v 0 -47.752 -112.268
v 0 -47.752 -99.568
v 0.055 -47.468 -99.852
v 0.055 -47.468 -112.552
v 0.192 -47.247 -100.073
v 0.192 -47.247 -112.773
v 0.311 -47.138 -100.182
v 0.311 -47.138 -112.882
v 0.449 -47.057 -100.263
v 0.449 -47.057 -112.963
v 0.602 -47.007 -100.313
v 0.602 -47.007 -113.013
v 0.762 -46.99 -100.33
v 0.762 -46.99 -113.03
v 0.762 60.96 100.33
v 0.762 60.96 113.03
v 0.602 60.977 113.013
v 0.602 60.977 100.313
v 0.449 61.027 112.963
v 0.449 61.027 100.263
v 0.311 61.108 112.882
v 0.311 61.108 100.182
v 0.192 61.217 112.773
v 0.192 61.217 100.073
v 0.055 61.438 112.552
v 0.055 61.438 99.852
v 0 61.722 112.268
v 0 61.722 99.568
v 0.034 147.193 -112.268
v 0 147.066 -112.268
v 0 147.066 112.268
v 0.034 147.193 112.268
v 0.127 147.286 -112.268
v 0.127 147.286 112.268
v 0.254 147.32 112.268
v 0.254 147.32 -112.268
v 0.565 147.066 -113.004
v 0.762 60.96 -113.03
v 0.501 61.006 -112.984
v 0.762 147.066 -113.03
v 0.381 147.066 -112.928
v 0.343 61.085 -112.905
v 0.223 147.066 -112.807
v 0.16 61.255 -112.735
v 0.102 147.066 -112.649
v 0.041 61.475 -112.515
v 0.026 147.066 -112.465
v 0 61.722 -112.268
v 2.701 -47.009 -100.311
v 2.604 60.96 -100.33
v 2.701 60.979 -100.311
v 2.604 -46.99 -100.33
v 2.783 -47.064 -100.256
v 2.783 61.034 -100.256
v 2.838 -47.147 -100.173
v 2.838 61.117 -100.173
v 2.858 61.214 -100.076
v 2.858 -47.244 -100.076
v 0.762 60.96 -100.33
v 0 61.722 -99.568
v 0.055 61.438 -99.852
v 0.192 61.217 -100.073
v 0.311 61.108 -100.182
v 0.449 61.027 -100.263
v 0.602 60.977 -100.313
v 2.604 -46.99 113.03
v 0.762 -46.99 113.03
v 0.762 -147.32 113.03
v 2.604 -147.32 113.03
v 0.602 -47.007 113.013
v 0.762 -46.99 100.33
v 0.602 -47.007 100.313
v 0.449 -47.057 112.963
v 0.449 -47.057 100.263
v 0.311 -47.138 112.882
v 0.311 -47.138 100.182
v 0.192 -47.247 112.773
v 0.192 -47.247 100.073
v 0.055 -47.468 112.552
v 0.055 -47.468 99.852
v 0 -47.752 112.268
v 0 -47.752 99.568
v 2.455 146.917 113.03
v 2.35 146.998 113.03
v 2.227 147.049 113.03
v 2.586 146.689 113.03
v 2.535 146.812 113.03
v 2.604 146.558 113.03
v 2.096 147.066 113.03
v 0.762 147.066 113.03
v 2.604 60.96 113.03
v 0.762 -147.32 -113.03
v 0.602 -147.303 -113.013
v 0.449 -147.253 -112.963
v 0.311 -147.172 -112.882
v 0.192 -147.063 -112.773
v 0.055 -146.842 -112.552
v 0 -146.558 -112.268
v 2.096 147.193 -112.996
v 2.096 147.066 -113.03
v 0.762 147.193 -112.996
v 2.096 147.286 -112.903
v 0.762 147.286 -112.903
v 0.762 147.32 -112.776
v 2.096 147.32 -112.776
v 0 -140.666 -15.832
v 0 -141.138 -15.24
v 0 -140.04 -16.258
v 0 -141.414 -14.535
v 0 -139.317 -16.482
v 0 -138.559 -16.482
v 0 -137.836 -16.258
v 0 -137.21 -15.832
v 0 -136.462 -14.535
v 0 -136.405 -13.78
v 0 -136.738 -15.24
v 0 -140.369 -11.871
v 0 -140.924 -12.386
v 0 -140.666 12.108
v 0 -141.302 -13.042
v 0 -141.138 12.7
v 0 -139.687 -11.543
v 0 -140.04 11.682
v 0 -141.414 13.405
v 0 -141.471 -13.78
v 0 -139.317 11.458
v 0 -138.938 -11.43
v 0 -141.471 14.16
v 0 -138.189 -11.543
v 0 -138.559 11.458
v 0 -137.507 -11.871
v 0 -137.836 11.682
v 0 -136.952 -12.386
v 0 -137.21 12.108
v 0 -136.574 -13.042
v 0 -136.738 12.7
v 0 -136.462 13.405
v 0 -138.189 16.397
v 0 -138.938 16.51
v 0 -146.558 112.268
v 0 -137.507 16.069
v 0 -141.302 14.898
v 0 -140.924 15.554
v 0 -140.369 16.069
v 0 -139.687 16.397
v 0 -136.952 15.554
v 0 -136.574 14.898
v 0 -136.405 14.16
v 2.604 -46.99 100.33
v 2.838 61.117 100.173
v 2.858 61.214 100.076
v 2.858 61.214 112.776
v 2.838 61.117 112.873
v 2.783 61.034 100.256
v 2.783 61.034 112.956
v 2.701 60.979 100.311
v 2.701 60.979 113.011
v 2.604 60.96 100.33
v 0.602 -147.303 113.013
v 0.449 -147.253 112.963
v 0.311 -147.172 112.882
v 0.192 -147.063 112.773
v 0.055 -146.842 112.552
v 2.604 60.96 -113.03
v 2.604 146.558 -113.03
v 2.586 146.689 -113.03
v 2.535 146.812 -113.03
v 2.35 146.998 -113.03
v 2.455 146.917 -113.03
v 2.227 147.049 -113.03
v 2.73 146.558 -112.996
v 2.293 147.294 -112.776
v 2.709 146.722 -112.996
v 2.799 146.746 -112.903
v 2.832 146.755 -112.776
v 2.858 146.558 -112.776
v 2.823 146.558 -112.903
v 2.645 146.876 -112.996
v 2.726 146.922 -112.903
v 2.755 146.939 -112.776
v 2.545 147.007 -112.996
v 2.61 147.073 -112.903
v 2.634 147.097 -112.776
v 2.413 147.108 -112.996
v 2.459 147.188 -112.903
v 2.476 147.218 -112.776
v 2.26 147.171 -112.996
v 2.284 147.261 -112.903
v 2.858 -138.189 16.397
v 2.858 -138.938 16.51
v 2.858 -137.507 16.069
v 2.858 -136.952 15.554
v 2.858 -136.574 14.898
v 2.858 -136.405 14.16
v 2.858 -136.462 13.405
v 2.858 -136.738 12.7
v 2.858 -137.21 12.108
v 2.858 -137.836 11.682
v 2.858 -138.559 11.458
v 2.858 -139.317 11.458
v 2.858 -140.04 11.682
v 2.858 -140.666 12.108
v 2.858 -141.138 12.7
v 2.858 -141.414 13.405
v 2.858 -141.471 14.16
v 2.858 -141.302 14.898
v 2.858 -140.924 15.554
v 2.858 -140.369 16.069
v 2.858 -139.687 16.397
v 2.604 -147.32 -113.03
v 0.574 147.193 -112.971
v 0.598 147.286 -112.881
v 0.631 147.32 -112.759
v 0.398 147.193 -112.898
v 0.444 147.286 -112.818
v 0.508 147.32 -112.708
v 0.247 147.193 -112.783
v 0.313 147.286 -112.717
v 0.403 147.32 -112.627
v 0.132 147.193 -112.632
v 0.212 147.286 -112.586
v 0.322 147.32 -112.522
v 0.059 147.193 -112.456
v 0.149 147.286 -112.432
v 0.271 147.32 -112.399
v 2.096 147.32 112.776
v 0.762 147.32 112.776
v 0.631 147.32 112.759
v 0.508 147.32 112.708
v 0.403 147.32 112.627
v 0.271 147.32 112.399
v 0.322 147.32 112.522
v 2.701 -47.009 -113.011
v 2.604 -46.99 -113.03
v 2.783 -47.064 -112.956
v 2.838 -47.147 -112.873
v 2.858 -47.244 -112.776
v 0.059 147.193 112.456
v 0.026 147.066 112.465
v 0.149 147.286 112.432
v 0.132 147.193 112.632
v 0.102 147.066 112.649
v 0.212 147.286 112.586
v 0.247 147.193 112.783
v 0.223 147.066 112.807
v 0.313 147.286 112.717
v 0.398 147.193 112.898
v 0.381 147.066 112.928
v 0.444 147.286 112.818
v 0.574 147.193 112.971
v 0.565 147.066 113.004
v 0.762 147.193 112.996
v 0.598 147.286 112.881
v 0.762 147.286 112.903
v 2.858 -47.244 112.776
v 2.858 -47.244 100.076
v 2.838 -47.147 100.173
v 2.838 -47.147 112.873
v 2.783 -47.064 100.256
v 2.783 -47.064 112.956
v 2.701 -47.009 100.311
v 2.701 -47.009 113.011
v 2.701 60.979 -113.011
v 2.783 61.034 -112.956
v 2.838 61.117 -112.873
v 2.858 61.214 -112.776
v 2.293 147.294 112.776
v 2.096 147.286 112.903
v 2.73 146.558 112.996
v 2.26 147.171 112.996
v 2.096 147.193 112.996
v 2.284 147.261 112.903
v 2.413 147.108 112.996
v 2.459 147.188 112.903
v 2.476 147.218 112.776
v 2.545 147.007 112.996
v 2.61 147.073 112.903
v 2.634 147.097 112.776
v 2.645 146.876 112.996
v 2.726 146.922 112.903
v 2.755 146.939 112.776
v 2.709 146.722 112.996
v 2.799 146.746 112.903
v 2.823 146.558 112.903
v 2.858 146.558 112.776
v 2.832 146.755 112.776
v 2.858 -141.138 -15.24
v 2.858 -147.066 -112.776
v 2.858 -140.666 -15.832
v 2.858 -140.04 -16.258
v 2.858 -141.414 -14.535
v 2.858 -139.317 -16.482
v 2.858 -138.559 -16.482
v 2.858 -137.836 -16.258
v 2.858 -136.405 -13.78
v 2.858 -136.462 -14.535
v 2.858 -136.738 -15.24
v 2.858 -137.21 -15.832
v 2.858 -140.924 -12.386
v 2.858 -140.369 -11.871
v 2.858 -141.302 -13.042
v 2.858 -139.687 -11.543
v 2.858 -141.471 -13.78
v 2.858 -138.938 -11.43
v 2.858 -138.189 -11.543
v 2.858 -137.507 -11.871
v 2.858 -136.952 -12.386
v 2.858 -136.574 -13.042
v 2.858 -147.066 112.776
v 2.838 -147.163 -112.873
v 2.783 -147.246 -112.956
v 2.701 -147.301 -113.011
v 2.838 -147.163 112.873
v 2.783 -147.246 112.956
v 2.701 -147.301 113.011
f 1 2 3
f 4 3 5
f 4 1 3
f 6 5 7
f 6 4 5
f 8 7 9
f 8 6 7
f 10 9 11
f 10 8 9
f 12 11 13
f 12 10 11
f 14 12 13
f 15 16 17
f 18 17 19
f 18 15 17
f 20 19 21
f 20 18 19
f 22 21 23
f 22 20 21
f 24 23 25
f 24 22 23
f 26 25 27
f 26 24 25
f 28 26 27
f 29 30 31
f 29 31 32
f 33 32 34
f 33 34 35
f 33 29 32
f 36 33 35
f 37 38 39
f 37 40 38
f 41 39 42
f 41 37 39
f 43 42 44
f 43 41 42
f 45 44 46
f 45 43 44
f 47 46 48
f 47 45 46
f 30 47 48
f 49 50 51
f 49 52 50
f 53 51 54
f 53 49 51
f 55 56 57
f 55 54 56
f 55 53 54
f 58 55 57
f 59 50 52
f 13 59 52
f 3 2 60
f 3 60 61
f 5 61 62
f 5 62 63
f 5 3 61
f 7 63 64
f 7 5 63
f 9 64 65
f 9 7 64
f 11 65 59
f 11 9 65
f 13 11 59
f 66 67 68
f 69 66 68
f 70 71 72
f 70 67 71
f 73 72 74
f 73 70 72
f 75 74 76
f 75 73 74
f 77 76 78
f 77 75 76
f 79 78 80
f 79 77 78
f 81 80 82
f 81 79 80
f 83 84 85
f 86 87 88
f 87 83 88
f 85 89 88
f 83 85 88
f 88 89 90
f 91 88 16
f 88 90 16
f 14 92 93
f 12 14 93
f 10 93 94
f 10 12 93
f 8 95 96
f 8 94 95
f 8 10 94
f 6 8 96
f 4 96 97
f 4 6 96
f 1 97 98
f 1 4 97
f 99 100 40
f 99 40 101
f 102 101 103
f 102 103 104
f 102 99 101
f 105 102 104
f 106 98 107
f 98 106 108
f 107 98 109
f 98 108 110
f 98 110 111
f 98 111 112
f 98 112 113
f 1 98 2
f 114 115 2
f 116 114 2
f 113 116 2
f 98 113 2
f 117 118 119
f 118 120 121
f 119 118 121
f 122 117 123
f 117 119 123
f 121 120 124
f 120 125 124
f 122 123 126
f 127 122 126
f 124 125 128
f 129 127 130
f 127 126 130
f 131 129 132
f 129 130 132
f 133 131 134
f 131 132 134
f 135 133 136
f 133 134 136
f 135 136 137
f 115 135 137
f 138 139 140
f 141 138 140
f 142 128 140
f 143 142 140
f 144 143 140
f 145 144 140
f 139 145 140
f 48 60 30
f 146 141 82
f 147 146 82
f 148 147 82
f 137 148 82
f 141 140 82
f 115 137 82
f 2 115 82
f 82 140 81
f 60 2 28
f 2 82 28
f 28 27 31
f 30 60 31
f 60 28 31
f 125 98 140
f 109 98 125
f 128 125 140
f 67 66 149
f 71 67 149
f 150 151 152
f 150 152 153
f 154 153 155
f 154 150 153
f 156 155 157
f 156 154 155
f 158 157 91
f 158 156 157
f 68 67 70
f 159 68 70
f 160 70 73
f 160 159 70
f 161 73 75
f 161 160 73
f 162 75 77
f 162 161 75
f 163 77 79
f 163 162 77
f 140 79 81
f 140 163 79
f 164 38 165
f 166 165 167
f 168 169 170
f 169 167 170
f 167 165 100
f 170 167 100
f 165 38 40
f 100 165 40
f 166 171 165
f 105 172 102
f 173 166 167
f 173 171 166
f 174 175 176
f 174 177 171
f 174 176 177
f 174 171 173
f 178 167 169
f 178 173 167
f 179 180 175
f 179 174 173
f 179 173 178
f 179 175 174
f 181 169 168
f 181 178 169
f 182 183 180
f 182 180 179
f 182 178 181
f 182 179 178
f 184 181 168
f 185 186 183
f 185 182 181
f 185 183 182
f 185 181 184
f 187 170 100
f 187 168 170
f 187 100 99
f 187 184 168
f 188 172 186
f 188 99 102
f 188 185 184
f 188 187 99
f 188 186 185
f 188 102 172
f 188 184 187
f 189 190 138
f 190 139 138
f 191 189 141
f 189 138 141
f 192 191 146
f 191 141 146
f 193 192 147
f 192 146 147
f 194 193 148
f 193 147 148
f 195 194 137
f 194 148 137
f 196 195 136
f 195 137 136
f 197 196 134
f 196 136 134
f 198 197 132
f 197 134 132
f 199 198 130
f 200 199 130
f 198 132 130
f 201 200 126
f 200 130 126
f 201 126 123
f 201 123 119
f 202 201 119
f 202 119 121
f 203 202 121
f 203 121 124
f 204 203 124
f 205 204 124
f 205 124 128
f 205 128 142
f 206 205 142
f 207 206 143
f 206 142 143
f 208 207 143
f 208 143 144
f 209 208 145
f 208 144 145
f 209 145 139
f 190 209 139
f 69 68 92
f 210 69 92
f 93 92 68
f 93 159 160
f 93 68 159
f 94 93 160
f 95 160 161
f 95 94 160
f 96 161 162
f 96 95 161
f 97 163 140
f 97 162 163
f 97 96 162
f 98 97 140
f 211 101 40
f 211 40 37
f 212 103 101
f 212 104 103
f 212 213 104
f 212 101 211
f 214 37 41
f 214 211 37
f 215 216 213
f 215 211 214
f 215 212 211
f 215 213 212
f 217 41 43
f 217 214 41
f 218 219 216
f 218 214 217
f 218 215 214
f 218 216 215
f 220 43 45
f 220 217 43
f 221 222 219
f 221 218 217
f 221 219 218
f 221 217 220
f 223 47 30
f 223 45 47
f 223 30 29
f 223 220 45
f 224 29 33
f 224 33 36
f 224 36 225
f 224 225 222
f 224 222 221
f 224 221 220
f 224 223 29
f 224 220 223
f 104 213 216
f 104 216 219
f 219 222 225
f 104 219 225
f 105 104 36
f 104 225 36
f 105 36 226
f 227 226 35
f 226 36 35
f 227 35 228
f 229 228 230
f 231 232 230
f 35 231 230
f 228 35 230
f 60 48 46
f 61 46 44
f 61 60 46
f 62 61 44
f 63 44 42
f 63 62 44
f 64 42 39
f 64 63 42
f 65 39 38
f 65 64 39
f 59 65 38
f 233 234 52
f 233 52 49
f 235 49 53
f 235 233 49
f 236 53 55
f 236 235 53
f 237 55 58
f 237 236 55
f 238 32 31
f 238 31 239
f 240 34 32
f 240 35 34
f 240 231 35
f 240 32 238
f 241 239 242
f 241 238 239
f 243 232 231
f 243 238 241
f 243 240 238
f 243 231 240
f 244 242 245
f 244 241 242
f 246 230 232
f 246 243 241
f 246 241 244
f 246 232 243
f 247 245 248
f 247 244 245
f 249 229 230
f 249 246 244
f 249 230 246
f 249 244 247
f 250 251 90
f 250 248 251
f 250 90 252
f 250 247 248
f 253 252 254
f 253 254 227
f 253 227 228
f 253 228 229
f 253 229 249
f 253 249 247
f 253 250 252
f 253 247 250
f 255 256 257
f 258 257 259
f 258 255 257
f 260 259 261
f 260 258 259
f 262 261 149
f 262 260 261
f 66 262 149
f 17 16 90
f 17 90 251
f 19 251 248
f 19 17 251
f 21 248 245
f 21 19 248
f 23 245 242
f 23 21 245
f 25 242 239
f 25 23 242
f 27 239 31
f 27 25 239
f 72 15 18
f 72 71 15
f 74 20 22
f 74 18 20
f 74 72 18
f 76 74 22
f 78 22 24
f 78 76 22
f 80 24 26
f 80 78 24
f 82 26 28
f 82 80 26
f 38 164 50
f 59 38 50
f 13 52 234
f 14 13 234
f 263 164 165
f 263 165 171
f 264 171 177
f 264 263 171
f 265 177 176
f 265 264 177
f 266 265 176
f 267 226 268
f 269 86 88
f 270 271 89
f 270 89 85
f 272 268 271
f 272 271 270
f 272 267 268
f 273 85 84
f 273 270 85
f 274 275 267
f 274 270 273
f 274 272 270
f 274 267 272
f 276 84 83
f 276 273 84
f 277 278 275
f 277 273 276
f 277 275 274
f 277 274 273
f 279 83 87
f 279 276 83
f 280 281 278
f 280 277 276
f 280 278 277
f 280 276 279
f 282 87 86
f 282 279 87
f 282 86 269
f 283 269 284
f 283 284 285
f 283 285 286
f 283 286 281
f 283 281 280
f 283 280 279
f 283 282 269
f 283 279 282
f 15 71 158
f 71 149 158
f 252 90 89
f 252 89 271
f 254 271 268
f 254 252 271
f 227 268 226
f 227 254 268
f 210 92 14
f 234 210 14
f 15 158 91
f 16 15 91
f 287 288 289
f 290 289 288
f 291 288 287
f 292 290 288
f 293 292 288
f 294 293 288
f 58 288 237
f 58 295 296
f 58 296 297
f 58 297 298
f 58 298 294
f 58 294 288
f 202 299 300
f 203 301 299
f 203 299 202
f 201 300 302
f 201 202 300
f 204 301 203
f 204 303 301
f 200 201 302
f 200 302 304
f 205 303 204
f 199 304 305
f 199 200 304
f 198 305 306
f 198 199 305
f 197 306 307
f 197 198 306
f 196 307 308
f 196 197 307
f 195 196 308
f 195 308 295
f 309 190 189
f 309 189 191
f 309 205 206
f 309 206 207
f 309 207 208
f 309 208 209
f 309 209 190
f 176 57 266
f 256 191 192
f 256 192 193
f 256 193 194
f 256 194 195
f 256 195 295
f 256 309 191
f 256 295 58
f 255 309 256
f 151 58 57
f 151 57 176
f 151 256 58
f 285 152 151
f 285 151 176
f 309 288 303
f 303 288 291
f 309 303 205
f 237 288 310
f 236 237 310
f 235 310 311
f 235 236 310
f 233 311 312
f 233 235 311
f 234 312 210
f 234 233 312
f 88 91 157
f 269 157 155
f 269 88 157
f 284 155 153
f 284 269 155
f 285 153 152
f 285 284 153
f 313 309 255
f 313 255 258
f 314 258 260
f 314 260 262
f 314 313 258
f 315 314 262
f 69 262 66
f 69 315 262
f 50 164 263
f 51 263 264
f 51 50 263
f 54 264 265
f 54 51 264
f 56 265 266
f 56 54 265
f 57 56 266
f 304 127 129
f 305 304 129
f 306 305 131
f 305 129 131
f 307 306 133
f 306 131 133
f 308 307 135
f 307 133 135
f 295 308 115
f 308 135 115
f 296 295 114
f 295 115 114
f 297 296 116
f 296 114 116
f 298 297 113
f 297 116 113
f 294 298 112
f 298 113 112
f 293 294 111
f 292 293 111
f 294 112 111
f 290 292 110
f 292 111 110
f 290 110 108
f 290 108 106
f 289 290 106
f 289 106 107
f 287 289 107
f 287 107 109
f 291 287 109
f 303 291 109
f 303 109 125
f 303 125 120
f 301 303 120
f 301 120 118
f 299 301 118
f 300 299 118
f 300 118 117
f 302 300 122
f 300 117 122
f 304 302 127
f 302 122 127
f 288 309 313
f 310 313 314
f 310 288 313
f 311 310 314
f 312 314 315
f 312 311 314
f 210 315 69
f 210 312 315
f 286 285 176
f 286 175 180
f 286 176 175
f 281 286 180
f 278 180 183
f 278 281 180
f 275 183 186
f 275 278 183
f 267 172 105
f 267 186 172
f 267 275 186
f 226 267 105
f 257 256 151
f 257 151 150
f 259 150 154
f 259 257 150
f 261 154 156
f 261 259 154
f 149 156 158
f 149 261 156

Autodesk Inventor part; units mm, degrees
ref_plane "YZ Plane" through (0, 0, 0) normal (1, 0, 0) x (0, 1, 0)
ref_plane "XZ Plane" through (0, 0, 0) normal (0, 1, 0) x (-1, 0, 0)
sketch "Sketch1" plane through (0, 0, 0) normal (1, 0, 0) x (0, 1, 0)
  line L0 (147.32, 113.03) -> (-147.32, 113.03)
  line L1 (-147.32, 113.03) -> (-147.32, -113.03)
  line L2 (-147.32, -113.03) -> (147.32, -113.03)
  line L3 (147.32, -113.03) -> (147.32, 113.03)
  line L4 (147.32, 113.03) -> (-147.32, -113.03) construction
  line L5 (-147.32, 113.03) -> (147.32, -113.03) construction
  point P0 (0, 0)
  dimension "d0" = 294.64
  dimension "d1" = 226.06
extrude "Extrusion1" add sketch "Sketch1" along normal blind 2.8575
sketch "Sketch2" plane through (2.8575, 0, 0) normal (1, 0, 0) x (0, 0, -1)
  line L0 (113.03, 60.96) -> (100.33, 60.96)
  line L1 (100.33, 60.96) -> (100.33, -46.99)
  line L2 (100.33, -46.99) -> (113.03, -46.99)
  line L3 (113.03, -147.32) -> (113.03, 147.32) projected
  line L4 (113.03, 147.32) -> (-113.03, 147.32) projected
  line L5 (113.03, 60.96) -> (113.03, -46.99)
  point P0 (0, 0)
  dimension "d4" = 107.95
  dimension "d5" = 0
  dimension "d6" = 0
  dimension "d7" = 12.7
  dimension "d8" = 86.36
extrude "Extrusion2" cut sketch "Sketch2" against normal blind 2.8575
mirror "Mirror1" about plane through (0, 0, 0) normal (0, 0, 1) of "Extrusion2"
ref_plane "Work Plane1" through (9.2075, 0, 0) normal (1, 0, 0) x (0, 0, -1)
fillet "Fillet2" radius 0.762 12 edges at (0, 104.14, -113.03) (0, 6.985, -100.33) (0, 60.96, -106.68) (0, -97.155, -113.03) (0, -46.99, -106.68) (0, -147.32, 0) (0, -97.155, 113.03) (0, -46.99, 106.68) (0, 6.985, 100.33) (0, 60.96, 106.68) (0, 104.14, 113.03) (2.8575, 147.32, 0)
fillet "Fillet4" radius 0.254 18 edges at (2.8575, -147.32, 0) (2.8575, -97.155, -113.03) (2.8575, 6.985, -100.33) (2.8575, -46.99, -106.68) (2.6343, 147.0968, -113.03) (1.4287, 147.32, -113.03) (0.2232, 147.32, -112.8068) (0, 147.32, 0) (0.2232, 147.32, 112.8068) (1.4287, 147.32, 113.03) (2.6343, 147.0968, 113.03) (2.8575, 103.759, 113.03) (2.8575, 103.759, -113.03) (2.8575, 60.96, -106.68) (2.8575, 60.96, 106.68) (2.8575, 6.985, 100.33) (2.8575, -97.155, 113.03) (2.8575, -46.99, 106.68)
sketch "Sketch7" plane through (0, 0, 0) normal (-1, 0, 0) x (0, 0, 1)
  circle A0 centre (-13.97, -138.938) radius 2.54
  line L0 (0, 0) -> (0, -146.558) construction
  line L1 (112.268, -146.558) -> (-112.268, -146.558) projected
  circle A1 centre (13.97, -138.938) radius 2.54
  dimension "d22" = 5.08
  dimension "d23" = 13.97
  dimension "d24" = 7.62
extrude "Extrusion4" cut sketch "Sketch7" against normal up to next
properties part number "BackFlap"
